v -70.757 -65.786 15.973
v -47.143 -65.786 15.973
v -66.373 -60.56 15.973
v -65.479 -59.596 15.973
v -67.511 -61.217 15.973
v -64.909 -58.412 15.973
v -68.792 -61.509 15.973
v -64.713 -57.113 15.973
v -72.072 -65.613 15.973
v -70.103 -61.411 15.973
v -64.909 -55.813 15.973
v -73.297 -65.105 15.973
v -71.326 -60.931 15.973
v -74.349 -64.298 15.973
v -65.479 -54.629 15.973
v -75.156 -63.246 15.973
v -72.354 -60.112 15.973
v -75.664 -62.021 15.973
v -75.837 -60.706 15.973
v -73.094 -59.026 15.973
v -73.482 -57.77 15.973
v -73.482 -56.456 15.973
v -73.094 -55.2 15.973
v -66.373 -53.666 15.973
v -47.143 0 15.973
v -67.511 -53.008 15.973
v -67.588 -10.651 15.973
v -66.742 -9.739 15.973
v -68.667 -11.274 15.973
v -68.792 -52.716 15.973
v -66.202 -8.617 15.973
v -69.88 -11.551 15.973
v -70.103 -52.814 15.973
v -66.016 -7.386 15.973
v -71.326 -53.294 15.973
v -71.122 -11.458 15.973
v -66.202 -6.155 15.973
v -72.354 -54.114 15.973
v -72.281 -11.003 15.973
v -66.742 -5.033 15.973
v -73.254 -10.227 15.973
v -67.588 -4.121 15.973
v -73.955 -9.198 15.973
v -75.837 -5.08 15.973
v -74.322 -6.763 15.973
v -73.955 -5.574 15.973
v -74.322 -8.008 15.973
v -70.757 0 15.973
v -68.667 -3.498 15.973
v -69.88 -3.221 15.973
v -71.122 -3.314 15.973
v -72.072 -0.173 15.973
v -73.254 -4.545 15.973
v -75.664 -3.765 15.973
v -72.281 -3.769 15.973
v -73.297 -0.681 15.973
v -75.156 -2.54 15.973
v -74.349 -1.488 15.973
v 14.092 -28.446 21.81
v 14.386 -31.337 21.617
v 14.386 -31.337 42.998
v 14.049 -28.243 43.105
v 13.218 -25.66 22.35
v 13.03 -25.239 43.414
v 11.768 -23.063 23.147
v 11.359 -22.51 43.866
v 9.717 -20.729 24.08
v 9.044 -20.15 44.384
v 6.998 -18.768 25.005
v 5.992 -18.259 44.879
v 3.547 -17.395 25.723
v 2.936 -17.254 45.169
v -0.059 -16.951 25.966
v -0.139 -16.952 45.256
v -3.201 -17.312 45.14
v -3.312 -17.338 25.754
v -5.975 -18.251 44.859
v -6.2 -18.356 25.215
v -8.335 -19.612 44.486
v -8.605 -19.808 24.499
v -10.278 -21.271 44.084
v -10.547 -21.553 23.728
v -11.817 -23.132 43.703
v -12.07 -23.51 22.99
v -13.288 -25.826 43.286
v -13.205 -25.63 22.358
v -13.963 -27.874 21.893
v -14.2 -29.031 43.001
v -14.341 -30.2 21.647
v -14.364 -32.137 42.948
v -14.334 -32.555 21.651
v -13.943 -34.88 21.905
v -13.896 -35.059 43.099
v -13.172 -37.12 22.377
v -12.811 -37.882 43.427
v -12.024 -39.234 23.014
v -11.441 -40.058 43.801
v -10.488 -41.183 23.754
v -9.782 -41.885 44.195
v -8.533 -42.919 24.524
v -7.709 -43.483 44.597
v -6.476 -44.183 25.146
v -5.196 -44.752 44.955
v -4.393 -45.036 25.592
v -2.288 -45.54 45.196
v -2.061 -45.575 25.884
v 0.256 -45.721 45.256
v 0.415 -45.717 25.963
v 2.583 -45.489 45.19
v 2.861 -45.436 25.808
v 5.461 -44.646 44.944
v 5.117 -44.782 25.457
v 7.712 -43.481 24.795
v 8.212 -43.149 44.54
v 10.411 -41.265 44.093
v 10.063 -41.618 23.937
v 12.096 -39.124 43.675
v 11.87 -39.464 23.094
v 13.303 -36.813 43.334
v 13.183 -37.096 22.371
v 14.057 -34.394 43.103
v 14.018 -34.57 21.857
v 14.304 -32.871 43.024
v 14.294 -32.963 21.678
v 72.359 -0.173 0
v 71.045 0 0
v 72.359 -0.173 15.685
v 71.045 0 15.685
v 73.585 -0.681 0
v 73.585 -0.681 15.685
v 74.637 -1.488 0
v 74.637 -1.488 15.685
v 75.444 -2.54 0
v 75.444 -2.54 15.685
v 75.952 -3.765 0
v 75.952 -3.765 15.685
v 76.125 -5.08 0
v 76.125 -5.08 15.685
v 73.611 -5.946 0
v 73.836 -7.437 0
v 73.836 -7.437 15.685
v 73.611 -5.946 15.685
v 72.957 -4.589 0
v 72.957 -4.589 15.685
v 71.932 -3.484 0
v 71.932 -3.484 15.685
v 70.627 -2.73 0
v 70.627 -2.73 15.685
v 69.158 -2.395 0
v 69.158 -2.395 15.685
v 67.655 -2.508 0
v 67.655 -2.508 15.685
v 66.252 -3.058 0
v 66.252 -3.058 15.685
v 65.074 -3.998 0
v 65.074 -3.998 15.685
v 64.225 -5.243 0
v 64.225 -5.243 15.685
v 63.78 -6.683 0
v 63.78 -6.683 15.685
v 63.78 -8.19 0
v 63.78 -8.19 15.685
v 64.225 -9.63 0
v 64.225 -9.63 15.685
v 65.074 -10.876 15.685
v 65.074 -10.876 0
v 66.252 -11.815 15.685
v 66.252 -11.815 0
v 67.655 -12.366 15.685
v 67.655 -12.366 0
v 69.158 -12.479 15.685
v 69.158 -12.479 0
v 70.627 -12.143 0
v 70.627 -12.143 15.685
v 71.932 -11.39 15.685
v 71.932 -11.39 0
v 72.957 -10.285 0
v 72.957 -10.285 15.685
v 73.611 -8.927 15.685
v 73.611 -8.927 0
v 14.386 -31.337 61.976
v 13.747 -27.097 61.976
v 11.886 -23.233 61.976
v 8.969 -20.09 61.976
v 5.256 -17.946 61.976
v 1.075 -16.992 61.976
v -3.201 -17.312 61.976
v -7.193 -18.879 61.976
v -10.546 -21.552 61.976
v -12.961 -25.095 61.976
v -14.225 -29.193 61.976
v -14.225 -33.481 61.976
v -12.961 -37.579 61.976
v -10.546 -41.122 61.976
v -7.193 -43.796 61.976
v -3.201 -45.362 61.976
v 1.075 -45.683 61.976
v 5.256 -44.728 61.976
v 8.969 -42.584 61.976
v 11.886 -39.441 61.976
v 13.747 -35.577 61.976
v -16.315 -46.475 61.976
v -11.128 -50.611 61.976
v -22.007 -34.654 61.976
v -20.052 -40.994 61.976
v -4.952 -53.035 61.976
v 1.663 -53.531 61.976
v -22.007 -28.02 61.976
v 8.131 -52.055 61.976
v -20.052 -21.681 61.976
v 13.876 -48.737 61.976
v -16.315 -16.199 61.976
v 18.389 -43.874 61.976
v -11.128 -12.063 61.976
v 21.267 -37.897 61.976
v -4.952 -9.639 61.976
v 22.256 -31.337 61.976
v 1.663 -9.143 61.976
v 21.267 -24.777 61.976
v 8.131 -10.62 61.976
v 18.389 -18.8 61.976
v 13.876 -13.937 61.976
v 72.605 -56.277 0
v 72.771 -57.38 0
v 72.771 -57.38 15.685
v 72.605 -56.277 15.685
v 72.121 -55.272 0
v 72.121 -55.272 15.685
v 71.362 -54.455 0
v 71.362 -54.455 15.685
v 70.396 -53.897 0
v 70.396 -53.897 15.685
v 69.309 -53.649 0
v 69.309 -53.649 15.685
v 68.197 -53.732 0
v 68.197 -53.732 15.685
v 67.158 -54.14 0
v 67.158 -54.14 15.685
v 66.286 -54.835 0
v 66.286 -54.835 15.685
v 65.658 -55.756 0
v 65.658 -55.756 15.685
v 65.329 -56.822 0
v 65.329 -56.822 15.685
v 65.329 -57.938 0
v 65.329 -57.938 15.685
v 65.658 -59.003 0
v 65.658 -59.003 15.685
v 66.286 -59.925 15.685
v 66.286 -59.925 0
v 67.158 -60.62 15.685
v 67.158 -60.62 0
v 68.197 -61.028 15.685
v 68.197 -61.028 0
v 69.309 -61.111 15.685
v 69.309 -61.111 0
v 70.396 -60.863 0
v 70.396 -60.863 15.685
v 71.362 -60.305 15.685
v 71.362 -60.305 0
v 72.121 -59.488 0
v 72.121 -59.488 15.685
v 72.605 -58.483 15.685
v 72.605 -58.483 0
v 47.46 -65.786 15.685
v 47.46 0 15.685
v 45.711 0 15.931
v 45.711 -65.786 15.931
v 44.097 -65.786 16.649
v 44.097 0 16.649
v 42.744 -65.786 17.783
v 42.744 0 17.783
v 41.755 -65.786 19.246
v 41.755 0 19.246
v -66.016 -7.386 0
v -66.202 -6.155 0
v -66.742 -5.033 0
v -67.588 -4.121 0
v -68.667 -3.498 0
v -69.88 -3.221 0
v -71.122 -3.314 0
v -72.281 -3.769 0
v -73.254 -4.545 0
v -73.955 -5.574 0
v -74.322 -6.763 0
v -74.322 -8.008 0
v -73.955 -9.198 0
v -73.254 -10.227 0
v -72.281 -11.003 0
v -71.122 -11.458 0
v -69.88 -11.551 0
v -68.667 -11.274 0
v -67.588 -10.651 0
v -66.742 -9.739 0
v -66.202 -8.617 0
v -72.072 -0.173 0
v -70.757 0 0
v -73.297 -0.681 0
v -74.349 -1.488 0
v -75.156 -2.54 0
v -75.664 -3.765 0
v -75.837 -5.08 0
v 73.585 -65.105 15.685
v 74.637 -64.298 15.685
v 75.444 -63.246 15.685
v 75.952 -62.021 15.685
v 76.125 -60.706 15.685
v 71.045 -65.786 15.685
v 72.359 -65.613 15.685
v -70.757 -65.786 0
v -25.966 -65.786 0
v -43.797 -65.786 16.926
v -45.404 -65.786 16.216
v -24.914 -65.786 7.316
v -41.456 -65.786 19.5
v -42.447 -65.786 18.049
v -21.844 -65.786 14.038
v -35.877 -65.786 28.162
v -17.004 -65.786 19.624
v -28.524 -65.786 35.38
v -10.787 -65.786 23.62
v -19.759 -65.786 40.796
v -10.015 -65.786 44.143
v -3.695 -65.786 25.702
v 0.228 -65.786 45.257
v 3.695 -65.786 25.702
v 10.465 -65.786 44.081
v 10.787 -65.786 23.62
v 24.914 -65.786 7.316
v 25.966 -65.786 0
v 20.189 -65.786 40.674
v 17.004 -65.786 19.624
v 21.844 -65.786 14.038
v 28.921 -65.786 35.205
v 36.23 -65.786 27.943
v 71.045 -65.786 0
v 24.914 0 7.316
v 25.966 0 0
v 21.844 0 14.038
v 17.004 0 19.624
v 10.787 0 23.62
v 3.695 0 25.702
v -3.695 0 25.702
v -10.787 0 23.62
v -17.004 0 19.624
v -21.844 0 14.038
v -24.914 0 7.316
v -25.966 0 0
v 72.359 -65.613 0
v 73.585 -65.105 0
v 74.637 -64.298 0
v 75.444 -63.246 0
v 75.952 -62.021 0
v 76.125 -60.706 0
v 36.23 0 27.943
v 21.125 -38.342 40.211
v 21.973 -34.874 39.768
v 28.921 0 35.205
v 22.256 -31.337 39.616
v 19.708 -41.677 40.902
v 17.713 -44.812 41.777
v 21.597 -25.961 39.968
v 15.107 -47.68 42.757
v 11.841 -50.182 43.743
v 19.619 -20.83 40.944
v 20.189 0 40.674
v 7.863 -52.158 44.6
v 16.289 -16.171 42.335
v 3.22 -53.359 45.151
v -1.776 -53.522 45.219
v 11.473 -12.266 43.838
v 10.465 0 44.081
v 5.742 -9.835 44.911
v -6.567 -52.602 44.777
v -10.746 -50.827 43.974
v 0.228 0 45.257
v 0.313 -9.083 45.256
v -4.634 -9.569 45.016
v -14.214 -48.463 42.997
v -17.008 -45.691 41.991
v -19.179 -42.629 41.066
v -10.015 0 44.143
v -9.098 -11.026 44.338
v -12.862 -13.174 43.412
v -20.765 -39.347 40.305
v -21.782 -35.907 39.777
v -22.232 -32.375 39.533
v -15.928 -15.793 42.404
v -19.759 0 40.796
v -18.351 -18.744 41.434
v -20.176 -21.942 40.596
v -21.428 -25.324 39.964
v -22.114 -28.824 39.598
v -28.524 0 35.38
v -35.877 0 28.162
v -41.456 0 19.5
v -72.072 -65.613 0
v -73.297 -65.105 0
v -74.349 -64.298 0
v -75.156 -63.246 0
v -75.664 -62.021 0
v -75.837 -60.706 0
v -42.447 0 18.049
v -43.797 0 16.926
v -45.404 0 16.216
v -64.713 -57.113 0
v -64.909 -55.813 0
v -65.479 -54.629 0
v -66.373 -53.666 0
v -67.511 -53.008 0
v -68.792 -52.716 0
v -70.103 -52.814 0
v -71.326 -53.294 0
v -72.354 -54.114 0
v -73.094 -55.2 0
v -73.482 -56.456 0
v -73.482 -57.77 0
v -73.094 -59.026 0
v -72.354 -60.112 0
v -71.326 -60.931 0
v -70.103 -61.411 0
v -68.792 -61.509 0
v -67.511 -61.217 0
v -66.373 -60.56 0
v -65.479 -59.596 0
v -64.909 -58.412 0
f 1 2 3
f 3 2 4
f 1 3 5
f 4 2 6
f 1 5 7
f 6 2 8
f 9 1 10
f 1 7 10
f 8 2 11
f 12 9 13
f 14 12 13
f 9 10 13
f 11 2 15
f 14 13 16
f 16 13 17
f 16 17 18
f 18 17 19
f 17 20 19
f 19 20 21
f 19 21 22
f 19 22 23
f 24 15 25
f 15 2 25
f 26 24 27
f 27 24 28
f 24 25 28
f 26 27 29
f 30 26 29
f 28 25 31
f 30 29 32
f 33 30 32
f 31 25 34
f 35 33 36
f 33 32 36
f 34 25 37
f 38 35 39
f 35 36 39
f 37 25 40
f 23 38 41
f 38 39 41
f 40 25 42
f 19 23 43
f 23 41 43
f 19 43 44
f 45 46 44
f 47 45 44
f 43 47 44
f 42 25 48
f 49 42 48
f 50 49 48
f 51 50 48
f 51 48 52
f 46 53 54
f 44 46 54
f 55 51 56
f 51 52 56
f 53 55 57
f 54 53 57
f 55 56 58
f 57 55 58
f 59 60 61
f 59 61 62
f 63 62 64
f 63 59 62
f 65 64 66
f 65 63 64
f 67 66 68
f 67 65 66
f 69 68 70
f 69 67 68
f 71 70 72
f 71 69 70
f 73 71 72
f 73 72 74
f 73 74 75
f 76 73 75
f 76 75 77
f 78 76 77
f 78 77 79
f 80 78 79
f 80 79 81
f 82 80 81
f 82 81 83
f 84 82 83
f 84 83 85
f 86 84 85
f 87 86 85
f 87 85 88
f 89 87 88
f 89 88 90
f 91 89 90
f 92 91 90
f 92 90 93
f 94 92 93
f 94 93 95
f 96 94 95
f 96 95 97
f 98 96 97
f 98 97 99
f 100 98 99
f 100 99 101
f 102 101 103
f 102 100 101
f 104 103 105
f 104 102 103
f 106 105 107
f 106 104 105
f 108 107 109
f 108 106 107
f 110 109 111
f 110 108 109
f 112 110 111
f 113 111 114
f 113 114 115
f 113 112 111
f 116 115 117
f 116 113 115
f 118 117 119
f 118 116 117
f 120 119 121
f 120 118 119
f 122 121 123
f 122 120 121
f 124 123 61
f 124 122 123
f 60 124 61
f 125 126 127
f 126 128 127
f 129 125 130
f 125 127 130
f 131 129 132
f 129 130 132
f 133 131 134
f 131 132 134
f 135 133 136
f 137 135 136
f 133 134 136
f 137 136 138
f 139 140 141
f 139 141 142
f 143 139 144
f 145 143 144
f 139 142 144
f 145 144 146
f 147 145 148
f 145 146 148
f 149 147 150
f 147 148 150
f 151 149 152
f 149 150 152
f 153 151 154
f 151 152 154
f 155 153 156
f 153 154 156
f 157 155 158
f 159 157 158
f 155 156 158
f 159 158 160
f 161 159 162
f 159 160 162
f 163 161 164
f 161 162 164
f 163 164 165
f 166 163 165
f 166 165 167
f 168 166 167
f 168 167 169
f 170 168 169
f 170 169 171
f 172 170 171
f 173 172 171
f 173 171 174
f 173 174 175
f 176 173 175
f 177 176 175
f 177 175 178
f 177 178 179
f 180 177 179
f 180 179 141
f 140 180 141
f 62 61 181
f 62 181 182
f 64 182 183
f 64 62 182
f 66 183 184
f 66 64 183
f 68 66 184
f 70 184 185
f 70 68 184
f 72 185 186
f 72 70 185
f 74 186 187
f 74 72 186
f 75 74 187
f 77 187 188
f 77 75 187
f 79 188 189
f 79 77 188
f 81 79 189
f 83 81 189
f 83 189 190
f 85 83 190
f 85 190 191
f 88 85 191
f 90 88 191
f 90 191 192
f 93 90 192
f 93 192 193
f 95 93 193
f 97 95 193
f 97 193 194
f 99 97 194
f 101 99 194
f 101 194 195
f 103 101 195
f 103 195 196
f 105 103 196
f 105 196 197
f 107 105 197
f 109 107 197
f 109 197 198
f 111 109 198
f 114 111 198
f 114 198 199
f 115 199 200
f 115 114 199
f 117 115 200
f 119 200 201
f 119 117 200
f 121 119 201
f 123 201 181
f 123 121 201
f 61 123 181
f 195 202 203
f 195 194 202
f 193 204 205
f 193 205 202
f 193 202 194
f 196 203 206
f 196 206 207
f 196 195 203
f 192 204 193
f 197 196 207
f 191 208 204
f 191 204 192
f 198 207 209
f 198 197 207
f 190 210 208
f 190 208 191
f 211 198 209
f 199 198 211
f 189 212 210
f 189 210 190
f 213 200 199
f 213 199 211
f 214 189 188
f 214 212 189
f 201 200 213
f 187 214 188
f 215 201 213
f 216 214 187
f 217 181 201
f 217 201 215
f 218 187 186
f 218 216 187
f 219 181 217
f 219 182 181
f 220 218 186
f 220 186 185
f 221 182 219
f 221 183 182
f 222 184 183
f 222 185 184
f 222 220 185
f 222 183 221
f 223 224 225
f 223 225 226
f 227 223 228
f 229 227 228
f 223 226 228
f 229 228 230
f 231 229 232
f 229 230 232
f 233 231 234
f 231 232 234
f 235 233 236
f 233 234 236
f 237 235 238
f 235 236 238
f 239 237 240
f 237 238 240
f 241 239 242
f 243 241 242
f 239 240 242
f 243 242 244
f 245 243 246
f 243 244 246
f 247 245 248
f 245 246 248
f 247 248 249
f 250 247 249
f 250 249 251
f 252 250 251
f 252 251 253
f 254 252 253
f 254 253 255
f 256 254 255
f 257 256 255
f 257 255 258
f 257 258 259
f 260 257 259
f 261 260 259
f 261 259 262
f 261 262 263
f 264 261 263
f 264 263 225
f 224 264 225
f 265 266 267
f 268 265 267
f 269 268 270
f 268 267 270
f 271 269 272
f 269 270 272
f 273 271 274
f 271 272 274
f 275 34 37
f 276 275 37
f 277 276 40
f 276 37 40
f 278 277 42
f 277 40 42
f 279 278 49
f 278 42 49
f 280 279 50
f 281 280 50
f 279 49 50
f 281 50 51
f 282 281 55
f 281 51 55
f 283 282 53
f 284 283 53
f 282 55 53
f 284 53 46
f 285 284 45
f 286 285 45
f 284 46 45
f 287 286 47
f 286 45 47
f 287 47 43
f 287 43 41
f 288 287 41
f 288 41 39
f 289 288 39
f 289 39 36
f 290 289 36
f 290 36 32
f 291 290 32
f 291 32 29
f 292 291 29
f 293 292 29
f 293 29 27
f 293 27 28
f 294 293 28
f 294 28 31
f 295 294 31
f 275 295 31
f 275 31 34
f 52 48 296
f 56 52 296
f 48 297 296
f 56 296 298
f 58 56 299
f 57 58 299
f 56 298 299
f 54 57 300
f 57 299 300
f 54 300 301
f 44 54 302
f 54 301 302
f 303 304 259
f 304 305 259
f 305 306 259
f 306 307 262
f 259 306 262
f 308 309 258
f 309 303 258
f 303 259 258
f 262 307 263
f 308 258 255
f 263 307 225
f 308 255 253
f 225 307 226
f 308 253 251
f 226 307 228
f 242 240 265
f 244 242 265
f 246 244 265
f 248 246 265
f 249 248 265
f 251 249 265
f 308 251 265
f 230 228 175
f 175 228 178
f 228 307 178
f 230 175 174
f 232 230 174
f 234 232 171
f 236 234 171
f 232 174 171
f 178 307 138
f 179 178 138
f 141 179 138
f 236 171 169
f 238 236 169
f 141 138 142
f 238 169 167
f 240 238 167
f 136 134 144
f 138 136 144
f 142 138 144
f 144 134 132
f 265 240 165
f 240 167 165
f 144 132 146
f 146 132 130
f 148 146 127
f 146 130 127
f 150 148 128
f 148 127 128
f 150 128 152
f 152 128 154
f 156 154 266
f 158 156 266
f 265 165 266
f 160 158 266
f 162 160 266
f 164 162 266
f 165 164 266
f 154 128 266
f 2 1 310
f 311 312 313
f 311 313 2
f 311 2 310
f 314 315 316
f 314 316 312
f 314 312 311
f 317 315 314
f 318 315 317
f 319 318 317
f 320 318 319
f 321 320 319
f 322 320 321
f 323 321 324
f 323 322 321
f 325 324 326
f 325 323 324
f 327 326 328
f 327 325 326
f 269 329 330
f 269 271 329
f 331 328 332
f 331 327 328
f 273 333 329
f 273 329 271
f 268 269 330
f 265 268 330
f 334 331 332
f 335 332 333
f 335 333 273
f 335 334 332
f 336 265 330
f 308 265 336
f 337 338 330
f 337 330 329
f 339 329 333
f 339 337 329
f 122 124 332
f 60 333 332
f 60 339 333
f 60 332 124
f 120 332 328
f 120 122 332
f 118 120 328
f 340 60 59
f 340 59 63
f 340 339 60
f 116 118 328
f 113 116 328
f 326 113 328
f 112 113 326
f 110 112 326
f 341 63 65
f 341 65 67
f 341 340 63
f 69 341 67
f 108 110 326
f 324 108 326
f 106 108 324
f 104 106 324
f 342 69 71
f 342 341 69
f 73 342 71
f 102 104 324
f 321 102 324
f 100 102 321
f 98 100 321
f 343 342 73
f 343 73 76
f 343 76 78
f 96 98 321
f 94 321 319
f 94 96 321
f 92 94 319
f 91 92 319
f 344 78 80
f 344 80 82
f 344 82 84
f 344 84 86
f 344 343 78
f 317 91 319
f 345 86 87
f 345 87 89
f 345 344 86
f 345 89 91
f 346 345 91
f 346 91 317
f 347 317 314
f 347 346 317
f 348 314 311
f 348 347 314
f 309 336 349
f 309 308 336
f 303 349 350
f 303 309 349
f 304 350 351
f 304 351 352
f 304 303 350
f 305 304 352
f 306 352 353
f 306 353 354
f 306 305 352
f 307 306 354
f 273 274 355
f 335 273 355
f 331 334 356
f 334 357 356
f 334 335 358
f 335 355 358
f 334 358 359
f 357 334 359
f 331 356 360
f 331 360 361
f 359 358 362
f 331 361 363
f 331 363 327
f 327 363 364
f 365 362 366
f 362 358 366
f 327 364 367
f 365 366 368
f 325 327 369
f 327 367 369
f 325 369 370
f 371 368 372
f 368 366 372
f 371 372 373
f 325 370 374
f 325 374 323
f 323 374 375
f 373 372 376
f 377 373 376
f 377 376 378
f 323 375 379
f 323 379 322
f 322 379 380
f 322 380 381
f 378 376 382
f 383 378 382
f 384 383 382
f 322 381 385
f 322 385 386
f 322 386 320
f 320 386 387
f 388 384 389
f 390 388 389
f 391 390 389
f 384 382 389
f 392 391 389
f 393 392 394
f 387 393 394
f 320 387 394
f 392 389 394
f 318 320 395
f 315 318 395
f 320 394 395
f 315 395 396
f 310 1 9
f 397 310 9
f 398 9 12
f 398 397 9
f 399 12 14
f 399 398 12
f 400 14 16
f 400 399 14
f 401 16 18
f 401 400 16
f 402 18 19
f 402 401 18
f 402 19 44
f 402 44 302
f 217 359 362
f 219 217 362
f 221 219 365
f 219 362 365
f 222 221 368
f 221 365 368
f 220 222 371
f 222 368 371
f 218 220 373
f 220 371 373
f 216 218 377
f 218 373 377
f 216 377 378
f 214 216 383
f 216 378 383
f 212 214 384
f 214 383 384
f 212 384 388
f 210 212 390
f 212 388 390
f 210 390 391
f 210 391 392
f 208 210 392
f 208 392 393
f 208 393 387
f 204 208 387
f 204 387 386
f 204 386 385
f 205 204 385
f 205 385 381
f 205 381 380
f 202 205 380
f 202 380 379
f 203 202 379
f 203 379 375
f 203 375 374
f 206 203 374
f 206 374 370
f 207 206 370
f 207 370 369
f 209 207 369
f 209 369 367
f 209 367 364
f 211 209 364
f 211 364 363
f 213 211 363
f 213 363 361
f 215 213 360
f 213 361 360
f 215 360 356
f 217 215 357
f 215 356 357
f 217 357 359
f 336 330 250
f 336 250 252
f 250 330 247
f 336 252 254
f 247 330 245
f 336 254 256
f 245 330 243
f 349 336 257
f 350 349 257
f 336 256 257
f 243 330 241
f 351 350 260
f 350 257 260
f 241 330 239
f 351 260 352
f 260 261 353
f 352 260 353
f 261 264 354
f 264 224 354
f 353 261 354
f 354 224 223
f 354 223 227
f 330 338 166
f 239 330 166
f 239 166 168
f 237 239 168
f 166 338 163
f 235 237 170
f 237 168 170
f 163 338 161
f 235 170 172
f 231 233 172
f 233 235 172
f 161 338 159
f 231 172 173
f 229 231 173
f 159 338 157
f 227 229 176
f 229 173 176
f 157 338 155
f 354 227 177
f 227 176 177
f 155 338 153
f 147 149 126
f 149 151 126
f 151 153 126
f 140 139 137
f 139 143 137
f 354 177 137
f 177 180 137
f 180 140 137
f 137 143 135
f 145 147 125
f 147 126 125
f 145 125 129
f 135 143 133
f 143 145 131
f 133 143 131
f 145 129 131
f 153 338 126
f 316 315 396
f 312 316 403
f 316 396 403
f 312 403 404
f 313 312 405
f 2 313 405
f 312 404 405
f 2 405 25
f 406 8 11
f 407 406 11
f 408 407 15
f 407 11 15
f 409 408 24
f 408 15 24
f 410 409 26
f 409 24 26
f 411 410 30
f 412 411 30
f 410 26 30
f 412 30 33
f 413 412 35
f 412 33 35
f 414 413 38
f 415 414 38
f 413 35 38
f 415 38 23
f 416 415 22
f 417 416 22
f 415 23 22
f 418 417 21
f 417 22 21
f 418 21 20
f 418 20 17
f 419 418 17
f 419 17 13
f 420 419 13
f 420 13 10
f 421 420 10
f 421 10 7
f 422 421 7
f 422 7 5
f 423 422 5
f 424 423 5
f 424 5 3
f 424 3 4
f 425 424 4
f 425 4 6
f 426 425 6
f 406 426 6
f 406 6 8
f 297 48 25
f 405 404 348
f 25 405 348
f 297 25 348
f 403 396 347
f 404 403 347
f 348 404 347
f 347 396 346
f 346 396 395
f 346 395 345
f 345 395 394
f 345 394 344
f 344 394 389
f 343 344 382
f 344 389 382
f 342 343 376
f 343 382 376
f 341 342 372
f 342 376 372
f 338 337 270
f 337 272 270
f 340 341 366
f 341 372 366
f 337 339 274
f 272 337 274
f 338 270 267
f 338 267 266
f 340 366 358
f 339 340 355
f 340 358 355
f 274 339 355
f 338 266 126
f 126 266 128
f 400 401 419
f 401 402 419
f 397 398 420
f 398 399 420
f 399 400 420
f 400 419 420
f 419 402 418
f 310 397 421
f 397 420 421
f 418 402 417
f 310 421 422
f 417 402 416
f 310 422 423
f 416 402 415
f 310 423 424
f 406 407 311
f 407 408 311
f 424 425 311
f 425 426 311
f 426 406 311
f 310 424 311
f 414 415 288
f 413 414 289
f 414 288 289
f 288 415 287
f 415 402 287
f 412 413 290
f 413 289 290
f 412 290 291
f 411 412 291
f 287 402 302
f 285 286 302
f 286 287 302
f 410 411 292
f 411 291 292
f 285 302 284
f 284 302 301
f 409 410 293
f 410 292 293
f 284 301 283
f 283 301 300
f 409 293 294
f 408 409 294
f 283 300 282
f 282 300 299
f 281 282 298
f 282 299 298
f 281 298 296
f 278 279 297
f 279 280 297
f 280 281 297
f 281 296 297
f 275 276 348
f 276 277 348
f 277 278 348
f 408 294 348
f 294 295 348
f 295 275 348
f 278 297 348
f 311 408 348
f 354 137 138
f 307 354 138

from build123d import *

# Parameters (mm, degrees)
F1_DEPTH  = 65.786
F2_R      = 4.1764569431
F2_R_2    = 4.4090075628
F3_DEPTH  = 25.4
F2_R_3    = 5.0559602499
F2_R_4    = 3.7416125294
F4_DEPTH  = 25.4
F5_R      = 14.3858151817
F6_DEPTH  = 68.072
F5_R_2    = 22.255871479
F7_DEPTH  = 61.976
F8_R      = 5.08
F9_R      = 25.9662767353
F10_DEPTH = 113.792


# Not quite as in the source:
# - a feature names something its author has since deleted; it is built from what else it names


with BuildPart() as f1:
    # F0 (on Front) → F1 (new body)
    with BuildSketch(Plane.XZ):
        with BuildLine():
            ThreePointArc((-25.7879418184, 0), (0, 25.7879418184), (25.7879418184, 0))
            Line((25.7879418184, 0), (76.1246234179, 0))
            Line((76.1246234179, 0), (76.1246234179, 15.6854130328))
            Line((76.1246234179, 15.6854130328), (47.4599736899, 15.6854130328))
            ThreePointArc((47.4599736899, 15.6854130328), (44.0974699454, 16.6487565032), (41.7552011698, 19.2464937988))
            ThreePointArc((41.7552011698, 19.2464937988), (0.2284915035, 45.2565071244), (-41.4557046581, 19.4996400932))
            ThreePointArc((-41.4557046581, 19.4996400932), (-43.7973018606, 16.9263567372), (-47.1434027, 15.9732177854))
            Line((-47.1434027, 15.9732177854), (-75.83681494, 15.9732177854))
            Line((-75.83681494, 15.9732177854), (-75.83681494, 0))
            Line((-75.83681494, 0), (-25.7879418184, 0))
        make_face()
    extrude(amount=F1_DEPTH)

    # F2 (on face) → F3 (cut)
    with BuildSketch(Plane.XY.offset(15.9732177854)):
        with Locations((-70.1924338937, -7.3858876713)):
            Circle(F2_R)
        with Locations((-69.1219046712, -57.112660259)):
            Circle(F2_R_2)
    extrude(amount=-F3_DEPTH, mode=Mode.SUBTRACT)

    # F2 (on face) → F4 (cut)
    with BuildSketch(Plane.XY.offset(15.9732177854)):
        with Locations((68.7799453735, -7.4367355555)):
            Circle(F2_R_3)
        with Locations((69.0292343497, -57.3799200356)):
            Circle(F2_R_4)
    extrude(amount=-F4_DEPTH, mode=Mode.SUBTRACT)

    # F5 (on Top) → F6 (cut)
    with BuildSketch(Plane.XY):
        with Locations((0, -31.3370935619)):
            Circle(F5_R)
    extrude(amount=F6_DEPTH, mode=Mode.SUBTRACT)

    # F5 (on Top) → F7 (join)
    with BuildSketch(Plane.XY):
        with Locations((0, -31.3370935619)):
            Circle(F5_R_2)
        with Locations((0, -31.3370935619)):
            Circle(F5_R, mode=Mode.SUBTRACT)
    extrude(amount=F7_DEPTH)

    # F8
    f8_edges = [f1.edges().sort_by_distance(p)[0] for p in [
        (76.124623, -65.786, 7.842707),
        (76.124623, 0, 7.842707),
        (-75.836815, 0, 7.986609),
        (-75.836815, -65.786, 7.986609),
    ]]
    fillet(f8_edges, radius=F8_R)

    # F9 (on Front) → F10 (cut)
    with BuildSketch(Plane.XZ):
        Circle(F9_R)
    extrude(amount=F10_DEPTH, mode=Mode.SUBTRACT)


solid = f1.part
